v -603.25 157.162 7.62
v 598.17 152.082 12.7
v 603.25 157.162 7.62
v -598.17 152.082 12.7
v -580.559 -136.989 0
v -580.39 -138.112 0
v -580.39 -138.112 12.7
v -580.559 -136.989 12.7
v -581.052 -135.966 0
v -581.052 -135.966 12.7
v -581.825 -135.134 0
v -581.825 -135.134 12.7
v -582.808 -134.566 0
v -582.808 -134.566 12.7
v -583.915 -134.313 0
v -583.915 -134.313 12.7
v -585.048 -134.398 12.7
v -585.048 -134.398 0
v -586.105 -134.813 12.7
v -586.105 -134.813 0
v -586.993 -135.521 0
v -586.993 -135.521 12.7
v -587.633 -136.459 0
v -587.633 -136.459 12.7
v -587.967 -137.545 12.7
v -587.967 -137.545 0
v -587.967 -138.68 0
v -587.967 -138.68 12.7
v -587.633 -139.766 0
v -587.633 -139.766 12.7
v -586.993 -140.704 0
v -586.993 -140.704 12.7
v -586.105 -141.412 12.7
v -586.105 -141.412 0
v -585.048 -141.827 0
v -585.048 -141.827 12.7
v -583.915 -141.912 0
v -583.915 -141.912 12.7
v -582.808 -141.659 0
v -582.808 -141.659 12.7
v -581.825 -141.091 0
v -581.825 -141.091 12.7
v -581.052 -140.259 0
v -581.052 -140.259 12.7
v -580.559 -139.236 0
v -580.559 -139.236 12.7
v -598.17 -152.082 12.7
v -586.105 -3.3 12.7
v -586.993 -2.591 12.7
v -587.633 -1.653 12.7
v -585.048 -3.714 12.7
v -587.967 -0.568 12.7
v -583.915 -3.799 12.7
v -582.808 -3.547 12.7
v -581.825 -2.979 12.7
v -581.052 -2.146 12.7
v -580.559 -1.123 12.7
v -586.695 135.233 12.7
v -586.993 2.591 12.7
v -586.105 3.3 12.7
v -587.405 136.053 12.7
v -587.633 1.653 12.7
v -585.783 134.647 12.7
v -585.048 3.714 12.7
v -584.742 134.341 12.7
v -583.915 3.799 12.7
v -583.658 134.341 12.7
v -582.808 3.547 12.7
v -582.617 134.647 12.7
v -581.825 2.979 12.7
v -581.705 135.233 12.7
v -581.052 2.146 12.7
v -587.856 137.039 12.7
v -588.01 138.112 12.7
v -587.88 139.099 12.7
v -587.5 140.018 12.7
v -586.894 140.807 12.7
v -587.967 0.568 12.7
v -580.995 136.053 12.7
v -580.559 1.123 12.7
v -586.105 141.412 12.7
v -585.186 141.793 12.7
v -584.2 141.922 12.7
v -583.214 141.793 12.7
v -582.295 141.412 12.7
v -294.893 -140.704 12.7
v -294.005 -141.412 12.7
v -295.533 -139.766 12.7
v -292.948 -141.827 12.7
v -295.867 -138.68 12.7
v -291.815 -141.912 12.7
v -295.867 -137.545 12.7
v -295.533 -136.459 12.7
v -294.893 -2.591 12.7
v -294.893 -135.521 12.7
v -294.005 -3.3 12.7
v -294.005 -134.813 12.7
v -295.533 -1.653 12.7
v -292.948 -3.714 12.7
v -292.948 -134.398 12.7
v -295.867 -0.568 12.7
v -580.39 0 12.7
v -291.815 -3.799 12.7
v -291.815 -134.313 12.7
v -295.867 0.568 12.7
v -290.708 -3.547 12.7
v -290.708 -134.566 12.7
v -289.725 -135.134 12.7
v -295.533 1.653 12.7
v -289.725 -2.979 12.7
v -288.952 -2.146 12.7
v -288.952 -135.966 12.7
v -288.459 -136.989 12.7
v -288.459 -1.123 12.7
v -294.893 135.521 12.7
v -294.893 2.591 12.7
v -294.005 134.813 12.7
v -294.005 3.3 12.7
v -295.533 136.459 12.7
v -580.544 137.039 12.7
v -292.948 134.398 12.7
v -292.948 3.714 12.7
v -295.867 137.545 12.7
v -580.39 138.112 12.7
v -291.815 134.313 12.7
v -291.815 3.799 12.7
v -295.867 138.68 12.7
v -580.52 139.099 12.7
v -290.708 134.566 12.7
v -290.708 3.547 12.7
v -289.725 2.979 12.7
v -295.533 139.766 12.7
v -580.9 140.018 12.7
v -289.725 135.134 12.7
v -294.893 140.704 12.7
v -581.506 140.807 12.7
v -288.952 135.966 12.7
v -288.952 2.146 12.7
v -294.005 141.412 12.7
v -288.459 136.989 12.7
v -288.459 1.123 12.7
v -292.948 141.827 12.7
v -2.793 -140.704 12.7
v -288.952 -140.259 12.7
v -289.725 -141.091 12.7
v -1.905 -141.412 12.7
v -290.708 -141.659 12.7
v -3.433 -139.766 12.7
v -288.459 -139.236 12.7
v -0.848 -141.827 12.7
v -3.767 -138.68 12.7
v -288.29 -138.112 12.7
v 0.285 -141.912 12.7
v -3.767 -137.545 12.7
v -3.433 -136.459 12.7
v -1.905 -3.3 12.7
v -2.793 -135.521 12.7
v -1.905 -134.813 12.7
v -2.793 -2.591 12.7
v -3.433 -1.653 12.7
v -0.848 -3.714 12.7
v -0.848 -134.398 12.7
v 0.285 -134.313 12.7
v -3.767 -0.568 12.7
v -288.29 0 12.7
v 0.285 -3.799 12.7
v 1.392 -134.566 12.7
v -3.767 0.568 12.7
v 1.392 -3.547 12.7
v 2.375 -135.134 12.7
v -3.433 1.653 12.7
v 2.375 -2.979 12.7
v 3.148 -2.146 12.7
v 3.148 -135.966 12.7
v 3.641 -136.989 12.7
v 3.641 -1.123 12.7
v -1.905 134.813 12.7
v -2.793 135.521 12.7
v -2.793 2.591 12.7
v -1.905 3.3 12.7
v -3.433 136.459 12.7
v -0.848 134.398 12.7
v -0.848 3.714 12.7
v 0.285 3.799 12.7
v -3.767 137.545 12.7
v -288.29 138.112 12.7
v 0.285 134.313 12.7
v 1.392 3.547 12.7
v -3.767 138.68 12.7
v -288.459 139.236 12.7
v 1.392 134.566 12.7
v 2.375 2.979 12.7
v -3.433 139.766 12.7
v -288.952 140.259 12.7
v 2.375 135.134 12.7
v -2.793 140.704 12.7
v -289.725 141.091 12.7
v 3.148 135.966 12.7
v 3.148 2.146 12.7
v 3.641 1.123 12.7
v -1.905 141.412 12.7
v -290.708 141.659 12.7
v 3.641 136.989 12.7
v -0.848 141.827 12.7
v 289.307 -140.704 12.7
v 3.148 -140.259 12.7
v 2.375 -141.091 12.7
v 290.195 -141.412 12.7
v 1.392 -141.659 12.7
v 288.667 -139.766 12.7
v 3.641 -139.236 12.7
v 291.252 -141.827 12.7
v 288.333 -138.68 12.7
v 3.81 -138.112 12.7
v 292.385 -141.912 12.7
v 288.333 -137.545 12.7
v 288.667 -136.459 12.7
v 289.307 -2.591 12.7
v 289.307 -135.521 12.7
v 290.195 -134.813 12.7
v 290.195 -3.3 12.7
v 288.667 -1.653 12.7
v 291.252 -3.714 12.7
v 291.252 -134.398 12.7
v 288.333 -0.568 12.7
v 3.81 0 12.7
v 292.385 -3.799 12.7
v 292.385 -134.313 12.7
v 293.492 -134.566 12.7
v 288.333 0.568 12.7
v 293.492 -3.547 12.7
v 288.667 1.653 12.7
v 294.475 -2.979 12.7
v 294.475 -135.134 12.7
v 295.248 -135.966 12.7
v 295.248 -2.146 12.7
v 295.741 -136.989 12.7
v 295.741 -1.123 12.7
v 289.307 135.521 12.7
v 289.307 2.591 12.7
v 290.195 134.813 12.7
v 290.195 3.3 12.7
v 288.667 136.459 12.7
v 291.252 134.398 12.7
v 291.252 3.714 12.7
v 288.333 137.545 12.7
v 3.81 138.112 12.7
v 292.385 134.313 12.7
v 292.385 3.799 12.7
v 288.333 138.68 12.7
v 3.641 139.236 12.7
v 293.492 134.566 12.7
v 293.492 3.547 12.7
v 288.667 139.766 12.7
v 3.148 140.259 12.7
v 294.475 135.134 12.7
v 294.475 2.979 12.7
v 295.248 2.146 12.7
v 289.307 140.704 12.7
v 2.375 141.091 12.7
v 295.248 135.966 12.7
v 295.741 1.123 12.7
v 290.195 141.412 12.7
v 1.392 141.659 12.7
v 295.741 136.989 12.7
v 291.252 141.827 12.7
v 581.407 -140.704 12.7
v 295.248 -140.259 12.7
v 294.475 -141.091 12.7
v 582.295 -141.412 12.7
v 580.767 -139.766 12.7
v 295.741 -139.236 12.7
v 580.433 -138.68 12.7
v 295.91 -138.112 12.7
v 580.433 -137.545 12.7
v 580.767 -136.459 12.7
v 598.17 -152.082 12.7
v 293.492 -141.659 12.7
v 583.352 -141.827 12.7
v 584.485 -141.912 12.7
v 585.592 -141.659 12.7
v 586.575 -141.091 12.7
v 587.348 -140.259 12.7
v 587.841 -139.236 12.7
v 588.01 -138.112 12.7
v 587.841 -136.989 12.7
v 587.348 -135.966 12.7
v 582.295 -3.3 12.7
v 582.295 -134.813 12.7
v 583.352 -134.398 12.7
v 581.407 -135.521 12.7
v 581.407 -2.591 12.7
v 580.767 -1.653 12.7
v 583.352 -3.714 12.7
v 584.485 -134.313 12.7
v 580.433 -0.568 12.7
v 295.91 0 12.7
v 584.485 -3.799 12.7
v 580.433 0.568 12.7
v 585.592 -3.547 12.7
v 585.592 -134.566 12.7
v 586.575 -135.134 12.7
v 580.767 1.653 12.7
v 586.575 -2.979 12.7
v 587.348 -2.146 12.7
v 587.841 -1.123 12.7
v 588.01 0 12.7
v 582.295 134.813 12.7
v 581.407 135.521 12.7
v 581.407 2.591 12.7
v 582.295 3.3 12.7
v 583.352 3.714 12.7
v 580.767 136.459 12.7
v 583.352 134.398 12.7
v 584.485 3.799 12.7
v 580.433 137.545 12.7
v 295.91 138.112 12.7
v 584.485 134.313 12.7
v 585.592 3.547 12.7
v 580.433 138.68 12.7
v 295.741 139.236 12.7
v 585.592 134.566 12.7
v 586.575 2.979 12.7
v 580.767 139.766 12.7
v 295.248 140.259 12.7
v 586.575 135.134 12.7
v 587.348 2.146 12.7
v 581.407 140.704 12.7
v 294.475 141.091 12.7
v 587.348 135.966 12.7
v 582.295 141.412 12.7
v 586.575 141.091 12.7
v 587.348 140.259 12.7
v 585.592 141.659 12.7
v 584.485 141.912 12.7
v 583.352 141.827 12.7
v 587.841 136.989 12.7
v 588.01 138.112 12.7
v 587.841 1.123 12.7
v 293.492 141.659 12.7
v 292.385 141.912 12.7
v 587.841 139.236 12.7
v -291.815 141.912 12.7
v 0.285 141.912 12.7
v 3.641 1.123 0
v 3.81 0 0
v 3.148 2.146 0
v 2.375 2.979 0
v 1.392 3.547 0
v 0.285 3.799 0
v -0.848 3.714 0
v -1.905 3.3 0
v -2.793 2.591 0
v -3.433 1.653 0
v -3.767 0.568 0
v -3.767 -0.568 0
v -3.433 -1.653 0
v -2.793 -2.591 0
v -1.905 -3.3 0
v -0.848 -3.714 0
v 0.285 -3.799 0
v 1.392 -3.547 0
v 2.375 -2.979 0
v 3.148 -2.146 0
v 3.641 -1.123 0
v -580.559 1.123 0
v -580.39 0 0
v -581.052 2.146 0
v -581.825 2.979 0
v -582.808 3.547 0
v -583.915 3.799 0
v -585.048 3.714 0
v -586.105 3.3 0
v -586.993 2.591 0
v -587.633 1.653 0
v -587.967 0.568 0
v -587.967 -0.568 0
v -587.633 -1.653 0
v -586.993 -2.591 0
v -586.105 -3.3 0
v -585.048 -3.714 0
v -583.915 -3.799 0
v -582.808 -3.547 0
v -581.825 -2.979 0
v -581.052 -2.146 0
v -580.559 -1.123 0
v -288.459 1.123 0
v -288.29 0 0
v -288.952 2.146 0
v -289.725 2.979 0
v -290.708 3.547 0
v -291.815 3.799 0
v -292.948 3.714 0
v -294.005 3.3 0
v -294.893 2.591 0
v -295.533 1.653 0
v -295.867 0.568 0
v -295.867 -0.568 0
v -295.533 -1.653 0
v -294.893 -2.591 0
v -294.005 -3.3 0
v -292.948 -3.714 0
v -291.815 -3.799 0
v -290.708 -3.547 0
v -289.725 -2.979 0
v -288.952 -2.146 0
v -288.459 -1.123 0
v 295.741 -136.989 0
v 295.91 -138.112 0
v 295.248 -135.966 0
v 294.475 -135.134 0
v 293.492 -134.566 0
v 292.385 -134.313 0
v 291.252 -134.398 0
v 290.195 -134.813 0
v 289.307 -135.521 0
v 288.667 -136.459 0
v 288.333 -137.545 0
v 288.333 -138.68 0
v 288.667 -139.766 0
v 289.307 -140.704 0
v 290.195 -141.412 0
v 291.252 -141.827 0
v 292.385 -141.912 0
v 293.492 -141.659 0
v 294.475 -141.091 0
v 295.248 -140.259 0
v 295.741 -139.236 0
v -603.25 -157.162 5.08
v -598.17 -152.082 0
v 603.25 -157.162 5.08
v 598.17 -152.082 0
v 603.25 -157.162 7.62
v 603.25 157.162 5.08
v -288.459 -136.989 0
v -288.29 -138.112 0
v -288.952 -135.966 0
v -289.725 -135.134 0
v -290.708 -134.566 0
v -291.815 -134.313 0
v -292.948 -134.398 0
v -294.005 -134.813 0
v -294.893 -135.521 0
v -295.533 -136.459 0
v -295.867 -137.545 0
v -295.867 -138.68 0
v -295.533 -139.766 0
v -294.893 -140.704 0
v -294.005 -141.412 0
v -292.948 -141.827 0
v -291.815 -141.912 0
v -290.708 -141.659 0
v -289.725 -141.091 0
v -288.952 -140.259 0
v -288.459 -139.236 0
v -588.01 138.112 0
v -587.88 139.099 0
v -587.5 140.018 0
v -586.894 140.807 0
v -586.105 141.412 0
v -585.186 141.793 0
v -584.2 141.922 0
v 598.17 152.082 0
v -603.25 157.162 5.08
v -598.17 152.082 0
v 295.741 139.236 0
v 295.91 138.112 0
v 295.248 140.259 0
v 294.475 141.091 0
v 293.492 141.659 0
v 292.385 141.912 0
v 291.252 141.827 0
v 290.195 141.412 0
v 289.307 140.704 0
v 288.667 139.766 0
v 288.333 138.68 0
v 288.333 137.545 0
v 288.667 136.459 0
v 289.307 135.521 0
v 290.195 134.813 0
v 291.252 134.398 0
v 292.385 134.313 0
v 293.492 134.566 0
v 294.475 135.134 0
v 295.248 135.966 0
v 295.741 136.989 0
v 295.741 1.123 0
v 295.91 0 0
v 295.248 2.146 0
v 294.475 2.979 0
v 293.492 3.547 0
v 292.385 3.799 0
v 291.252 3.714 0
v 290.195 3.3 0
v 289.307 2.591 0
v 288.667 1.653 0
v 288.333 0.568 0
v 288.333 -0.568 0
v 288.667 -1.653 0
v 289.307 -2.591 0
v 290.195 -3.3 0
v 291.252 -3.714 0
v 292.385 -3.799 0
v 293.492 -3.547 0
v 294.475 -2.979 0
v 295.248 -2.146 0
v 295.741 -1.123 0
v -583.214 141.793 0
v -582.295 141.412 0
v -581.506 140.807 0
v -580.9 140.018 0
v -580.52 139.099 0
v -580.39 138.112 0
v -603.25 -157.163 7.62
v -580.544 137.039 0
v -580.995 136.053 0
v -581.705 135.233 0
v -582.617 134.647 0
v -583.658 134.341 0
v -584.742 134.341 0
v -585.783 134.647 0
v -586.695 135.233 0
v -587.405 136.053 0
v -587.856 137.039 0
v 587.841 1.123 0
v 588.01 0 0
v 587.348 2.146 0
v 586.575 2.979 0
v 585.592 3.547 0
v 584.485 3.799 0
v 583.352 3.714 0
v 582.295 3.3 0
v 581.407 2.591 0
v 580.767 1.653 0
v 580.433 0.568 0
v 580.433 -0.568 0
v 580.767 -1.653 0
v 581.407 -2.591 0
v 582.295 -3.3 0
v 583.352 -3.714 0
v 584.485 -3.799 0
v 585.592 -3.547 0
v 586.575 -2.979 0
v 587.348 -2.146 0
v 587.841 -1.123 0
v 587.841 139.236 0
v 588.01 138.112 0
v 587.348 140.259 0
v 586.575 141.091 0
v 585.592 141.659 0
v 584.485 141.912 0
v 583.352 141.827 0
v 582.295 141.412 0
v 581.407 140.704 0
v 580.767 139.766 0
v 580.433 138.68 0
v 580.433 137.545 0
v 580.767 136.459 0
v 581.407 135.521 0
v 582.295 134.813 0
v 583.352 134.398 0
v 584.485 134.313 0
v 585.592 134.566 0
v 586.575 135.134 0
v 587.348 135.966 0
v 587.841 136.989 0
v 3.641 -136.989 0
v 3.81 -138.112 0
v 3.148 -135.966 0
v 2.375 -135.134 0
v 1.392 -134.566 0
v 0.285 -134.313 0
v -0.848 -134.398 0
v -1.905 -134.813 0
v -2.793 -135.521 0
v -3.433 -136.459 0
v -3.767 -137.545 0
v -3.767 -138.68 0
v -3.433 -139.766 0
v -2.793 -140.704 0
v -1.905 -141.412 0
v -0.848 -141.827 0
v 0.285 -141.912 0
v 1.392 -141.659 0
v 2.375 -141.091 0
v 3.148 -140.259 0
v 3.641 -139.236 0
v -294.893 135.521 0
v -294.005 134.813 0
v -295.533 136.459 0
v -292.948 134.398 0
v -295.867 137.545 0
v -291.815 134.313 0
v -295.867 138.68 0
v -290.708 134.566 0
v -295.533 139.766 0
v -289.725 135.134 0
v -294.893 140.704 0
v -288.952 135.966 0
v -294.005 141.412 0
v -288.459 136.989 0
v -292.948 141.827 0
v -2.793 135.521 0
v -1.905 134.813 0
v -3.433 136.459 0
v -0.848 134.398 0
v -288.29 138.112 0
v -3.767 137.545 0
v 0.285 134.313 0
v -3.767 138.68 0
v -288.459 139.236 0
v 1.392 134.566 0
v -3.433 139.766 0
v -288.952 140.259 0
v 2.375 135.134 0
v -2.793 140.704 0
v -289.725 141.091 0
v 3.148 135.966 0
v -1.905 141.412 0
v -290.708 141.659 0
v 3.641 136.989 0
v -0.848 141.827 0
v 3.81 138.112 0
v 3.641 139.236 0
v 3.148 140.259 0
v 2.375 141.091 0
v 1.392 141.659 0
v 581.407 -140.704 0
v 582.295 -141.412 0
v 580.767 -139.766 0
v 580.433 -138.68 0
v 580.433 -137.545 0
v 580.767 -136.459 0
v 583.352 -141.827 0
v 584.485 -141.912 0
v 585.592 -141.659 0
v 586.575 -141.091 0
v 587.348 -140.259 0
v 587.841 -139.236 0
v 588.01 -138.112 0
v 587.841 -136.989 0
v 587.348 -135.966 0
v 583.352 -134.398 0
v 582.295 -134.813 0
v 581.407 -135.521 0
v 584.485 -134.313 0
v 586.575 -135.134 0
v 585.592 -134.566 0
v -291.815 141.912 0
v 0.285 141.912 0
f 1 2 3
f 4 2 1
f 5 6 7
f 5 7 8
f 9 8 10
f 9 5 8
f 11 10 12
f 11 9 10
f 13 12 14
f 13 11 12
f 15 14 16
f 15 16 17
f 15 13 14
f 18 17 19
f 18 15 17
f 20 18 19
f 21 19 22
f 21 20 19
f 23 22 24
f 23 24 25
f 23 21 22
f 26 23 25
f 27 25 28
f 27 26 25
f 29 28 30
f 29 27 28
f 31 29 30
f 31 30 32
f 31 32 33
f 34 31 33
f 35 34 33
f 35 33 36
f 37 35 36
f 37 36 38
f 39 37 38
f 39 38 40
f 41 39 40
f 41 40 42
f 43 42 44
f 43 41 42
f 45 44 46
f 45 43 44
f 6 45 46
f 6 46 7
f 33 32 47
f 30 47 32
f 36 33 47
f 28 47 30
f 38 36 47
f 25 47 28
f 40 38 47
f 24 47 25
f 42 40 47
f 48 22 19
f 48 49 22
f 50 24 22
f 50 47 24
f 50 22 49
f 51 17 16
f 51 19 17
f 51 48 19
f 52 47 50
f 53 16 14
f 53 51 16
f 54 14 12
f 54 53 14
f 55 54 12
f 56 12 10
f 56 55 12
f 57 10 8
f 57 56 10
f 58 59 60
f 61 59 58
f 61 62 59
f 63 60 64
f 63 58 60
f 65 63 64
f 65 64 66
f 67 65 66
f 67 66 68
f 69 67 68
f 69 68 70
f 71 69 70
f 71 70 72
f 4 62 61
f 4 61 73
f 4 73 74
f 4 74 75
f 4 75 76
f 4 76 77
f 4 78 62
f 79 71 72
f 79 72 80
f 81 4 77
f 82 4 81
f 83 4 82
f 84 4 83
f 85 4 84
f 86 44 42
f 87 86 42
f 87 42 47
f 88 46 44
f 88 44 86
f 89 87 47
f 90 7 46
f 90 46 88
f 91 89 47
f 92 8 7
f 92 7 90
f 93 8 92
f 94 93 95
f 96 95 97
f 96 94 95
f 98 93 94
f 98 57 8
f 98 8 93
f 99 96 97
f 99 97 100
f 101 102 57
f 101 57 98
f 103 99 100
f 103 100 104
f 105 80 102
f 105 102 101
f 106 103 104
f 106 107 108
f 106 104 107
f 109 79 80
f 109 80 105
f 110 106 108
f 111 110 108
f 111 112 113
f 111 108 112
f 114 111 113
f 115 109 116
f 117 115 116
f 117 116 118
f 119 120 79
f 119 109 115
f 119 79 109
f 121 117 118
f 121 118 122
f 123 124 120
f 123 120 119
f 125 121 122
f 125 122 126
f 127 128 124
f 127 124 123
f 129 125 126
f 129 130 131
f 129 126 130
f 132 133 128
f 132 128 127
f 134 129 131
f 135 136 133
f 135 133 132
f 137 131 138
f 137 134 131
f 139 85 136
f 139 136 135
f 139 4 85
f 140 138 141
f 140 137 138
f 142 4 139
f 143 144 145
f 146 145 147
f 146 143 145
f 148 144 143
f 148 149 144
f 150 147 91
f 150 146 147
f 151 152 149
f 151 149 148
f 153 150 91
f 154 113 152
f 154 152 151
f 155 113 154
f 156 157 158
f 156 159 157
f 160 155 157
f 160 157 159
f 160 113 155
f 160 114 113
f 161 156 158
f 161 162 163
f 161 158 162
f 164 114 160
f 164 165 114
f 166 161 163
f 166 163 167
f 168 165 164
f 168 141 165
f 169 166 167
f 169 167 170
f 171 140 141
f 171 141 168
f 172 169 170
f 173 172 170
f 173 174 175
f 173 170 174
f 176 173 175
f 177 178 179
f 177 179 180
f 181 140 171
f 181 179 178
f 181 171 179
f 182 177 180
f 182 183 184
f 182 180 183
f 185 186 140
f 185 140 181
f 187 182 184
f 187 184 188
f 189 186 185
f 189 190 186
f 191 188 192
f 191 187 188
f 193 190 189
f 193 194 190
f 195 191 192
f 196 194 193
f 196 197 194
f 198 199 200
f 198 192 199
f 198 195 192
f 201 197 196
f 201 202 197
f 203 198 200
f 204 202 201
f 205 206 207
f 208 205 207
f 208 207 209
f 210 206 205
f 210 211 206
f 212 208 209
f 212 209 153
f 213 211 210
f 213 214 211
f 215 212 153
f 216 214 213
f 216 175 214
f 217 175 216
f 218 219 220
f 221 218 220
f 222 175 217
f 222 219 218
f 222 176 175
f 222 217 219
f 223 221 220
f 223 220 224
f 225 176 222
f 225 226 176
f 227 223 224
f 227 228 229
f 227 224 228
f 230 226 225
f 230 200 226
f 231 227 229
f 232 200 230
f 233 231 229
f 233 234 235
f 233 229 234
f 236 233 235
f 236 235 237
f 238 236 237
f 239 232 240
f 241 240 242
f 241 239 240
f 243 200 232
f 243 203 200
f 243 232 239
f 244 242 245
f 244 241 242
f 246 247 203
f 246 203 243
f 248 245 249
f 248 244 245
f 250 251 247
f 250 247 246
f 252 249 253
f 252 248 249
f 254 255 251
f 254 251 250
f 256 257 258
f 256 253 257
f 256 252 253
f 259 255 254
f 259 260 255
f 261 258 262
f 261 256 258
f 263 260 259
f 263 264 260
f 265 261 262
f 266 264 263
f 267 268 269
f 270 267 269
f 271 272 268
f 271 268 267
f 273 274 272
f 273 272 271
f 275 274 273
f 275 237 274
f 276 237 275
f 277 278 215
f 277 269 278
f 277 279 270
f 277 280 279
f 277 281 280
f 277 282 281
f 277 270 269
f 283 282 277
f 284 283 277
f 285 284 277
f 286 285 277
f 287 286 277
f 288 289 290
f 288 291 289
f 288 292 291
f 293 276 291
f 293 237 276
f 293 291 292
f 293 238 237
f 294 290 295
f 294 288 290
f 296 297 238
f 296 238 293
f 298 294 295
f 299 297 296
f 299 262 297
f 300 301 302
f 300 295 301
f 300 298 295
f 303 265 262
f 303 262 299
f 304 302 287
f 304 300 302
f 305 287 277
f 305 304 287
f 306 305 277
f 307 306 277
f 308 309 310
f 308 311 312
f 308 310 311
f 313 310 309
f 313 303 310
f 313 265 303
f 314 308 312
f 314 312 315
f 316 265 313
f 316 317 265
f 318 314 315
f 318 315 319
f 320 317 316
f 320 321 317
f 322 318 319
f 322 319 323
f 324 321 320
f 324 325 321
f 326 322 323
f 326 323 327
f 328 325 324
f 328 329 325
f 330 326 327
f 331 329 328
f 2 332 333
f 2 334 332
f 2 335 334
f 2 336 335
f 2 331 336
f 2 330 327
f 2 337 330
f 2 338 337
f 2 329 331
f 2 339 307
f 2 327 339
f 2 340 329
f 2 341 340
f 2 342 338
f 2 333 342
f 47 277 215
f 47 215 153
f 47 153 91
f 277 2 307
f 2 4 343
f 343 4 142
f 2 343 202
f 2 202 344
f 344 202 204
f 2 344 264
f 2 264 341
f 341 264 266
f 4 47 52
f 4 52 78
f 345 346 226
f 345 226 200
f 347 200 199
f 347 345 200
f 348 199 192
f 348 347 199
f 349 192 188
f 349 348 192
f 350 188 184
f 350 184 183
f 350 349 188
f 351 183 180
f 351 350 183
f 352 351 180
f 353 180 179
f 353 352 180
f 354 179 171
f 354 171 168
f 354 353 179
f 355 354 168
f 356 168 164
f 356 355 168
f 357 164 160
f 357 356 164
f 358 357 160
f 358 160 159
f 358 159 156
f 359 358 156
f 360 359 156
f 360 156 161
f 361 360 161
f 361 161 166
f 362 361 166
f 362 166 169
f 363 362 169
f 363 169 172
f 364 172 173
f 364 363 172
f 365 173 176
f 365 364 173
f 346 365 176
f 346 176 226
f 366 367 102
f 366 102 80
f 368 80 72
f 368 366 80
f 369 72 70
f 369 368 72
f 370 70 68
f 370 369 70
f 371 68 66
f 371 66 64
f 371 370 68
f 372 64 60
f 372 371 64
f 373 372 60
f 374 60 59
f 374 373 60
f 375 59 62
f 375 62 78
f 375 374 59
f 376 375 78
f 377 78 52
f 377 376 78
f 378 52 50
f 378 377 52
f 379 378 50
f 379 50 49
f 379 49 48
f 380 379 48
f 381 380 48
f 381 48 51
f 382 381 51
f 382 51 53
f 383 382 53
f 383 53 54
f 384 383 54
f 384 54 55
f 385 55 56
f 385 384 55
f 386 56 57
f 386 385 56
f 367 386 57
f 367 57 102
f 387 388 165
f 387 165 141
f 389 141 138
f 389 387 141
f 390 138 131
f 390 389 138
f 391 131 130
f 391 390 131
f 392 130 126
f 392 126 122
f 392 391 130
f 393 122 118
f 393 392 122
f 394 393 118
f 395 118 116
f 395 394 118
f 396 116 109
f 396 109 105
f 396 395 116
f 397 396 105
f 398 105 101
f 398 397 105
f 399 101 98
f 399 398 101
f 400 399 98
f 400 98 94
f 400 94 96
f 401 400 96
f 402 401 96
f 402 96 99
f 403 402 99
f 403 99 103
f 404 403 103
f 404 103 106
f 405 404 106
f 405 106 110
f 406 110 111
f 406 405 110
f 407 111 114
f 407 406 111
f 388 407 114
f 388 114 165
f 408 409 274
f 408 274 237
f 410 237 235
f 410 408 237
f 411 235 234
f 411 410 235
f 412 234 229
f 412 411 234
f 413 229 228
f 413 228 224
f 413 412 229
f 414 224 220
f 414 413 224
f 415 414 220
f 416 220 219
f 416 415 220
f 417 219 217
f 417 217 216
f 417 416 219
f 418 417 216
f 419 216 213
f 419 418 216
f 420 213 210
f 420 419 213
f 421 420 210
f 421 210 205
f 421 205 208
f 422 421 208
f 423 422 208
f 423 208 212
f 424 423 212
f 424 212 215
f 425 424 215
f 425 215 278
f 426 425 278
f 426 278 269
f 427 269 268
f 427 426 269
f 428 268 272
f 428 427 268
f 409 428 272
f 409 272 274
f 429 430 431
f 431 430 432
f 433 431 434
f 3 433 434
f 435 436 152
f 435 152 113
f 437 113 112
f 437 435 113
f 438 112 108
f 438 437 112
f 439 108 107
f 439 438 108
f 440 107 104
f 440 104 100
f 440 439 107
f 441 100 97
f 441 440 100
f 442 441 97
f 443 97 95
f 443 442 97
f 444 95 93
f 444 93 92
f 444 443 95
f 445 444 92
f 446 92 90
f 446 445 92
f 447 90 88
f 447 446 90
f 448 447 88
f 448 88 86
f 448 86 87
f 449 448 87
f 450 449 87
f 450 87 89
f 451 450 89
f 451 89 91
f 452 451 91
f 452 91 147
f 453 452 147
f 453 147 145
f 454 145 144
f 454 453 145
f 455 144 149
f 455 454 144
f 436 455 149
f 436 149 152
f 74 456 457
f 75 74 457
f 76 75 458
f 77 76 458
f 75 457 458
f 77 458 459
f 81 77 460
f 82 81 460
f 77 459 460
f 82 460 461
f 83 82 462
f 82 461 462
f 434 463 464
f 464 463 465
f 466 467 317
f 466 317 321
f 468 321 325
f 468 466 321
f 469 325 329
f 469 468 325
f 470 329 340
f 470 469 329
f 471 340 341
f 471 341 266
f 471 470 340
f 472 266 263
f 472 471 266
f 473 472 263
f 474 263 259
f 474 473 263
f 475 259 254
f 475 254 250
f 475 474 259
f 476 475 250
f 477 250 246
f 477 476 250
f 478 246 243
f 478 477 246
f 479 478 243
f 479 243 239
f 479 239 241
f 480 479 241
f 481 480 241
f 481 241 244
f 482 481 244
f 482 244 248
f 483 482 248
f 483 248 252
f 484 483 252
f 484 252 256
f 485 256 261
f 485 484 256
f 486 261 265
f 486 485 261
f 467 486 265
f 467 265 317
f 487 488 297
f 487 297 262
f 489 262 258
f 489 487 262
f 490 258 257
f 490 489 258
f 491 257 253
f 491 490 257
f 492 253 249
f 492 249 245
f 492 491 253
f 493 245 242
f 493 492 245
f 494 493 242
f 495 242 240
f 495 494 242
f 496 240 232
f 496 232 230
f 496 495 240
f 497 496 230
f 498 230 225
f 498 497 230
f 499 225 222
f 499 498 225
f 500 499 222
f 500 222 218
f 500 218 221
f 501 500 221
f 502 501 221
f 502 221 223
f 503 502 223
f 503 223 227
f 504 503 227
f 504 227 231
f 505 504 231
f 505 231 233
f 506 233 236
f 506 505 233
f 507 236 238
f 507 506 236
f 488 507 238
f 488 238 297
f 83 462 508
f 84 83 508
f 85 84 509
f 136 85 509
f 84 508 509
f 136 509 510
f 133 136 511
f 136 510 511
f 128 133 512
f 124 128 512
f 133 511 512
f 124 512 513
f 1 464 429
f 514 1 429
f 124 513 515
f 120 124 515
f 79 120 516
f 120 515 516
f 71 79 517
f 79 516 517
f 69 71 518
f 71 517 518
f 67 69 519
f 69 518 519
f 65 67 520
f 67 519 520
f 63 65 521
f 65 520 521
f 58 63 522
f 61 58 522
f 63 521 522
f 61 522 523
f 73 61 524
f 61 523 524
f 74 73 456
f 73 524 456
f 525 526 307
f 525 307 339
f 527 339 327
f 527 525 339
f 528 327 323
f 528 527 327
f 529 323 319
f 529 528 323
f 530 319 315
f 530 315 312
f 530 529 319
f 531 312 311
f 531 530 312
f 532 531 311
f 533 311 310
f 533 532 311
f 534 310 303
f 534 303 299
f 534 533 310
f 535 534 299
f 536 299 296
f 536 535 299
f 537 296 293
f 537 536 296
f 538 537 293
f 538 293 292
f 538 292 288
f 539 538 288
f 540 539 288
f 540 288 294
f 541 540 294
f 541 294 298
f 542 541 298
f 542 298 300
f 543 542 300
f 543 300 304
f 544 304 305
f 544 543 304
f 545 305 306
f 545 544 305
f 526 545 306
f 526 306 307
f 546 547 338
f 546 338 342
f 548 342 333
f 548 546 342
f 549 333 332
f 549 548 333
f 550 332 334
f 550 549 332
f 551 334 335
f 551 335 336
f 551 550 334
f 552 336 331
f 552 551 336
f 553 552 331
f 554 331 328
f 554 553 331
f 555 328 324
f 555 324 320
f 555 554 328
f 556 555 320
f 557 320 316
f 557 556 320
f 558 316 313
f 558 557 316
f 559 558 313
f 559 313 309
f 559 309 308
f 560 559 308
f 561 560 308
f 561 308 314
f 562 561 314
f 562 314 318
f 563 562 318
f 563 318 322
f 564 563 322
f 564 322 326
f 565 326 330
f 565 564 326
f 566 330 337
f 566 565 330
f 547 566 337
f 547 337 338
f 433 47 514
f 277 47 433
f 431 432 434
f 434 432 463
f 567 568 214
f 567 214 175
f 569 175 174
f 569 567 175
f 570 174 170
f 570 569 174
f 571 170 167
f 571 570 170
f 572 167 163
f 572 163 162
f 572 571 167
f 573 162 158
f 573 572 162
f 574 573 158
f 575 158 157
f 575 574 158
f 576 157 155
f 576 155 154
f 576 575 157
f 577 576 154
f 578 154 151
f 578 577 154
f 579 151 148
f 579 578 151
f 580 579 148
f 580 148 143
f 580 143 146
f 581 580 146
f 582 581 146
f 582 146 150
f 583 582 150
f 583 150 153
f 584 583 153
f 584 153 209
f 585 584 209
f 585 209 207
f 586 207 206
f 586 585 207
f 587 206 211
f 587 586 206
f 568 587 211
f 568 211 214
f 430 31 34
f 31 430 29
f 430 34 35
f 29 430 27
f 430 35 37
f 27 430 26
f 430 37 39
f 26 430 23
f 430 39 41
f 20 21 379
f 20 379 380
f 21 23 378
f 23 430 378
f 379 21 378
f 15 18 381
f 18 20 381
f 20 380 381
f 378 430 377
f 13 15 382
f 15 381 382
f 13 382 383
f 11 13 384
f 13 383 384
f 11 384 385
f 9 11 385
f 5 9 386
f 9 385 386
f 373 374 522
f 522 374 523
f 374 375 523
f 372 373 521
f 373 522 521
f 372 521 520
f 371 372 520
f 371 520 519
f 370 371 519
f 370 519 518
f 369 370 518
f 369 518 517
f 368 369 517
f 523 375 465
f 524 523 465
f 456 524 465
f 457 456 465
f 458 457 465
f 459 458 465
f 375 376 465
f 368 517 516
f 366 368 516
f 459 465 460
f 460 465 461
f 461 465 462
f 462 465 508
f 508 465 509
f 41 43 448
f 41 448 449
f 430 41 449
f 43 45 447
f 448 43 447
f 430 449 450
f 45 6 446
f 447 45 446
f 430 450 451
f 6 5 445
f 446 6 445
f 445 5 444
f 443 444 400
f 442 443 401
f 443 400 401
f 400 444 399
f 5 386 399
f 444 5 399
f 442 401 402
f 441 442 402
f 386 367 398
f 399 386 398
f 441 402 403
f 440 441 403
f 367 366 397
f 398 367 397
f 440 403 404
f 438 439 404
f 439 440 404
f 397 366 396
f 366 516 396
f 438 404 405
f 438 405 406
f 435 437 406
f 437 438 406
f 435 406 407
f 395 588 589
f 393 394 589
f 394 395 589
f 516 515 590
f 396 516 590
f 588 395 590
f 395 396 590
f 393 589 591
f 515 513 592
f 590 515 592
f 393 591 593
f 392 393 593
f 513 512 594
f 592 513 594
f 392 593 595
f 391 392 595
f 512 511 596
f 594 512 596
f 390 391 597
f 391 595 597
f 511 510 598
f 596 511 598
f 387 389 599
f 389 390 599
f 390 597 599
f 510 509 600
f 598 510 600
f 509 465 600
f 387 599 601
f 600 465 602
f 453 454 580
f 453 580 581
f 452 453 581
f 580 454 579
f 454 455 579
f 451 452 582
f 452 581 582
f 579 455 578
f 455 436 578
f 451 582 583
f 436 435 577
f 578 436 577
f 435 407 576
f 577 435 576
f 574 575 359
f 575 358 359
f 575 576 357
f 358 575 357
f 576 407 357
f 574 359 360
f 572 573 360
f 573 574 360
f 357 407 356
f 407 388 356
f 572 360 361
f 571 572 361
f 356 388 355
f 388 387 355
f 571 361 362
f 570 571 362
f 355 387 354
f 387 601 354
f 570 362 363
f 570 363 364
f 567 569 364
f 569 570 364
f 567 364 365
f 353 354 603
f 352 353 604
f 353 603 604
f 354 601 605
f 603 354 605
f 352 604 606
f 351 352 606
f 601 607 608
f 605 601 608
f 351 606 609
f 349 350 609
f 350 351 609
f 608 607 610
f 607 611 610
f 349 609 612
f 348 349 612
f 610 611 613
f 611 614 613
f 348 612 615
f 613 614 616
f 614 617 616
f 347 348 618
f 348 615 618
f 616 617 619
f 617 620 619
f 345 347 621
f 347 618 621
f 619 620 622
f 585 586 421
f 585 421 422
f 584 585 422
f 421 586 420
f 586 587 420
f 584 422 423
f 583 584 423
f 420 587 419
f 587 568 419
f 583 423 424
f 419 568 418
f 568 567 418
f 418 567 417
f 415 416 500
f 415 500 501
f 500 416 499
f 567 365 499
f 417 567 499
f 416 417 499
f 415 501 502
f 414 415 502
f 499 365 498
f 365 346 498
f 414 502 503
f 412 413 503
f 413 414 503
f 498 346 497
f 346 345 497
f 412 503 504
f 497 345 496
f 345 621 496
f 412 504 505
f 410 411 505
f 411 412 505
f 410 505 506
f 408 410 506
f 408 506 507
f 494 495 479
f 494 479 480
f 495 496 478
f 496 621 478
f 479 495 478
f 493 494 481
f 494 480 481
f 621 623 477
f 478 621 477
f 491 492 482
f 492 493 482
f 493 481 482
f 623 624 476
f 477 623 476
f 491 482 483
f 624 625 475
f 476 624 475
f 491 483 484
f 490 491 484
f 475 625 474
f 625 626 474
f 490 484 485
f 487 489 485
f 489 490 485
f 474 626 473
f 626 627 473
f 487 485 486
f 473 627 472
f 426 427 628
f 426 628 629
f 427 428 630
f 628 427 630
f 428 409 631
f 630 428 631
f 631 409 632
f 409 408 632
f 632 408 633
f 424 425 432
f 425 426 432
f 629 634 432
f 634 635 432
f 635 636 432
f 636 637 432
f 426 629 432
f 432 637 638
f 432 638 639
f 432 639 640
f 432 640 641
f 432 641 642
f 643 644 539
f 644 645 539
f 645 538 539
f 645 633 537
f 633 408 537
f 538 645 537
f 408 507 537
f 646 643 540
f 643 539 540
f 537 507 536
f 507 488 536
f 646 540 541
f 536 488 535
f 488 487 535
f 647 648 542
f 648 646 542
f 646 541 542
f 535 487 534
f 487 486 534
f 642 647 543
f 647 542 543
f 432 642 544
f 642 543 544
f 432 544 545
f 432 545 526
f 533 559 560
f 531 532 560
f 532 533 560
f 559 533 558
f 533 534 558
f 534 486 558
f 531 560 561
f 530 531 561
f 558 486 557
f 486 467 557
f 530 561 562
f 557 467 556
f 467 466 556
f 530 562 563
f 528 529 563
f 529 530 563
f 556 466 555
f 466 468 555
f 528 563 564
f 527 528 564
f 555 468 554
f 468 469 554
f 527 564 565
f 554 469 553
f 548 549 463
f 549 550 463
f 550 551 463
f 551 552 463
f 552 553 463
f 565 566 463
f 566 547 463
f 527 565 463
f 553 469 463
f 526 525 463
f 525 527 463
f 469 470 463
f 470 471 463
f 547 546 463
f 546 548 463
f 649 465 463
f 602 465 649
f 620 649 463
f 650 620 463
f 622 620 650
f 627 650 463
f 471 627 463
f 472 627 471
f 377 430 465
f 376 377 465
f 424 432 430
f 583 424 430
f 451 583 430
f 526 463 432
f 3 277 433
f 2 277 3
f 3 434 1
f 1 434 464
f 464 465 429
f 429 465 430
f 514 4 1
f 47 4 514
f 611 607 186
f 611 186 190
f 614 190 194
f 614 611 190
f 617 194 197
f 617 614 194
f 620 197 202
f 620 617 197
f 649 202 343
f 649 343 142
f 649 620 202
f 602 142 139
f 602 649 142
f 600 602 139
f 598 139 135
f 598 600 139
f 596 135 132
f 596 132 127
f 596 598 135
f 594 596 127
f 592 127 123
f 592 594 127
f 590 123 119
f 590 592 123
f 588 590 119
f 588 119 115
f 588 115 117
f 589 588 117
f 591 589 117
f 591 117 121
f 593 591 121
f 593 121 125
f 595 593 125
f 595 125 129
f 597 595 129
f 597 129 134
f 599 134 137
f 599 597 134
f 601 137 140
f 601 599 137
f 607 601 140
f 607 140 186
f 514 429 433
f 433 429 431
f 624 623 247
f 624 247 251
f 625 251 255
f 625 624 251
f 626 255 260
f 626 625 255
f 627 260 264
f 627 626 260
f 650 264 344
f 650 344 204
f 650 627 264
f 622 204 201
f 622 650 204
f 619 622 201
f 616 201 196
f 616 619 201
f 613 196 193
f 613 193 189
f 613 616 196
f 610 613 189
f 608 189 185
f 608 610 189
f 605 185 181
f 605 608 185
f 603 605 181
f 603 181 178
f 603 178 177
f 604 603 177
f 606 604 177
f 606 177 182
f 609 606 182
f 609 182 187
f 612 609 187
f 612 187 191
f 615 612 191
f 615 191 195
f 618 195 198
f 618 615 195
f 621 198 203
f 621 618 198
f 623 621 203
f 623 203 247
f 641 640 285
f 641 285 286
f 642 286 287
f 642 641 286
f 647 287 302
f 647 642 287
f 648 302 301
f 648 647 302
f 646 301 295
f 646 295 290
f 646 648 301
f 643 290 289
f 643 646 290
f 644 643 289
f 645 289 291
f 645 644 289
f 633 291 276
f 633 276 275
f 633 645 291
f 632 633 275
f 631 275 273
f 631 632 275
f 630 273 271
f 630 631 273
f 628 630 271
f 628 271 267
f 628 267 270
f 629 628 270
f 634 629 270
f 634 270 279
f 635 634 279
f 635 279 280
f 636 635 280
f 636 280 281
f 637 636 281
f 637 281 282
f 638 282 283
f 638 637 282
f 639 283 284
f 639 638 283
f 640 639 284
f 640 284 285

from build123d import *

# Parameters (mm, degrees)
F0_R     = 3.81
F1_DEPTH = 12.7
F2_SIZE  = 5.08


with BuildPart() as f1:
    # F0 (on Top) → F1 (new body)
    with BuildSketch(Plane.XY):
        with BuildLine():
            Line((603.25, -157.1625), (603.25, 157.1625))
            Line((603.25, 157.1625), (-584.2, 157.1625))
            Line((-584.2, 157.1625), (-584.2, 141.9225))
            ThreePointArc((-584.2, 141.9225), (-581.505923, 140.806577), (-580.39, 138.1125))
            ThreePointArc((-580.39, 138.1125), (-584.2, 134.3025), (-588.01, 138.1125))
            Line((-588.01, 138.1125), (-603.25, 138.1125))
            Line((-603.25, 138.1125), (-603.25, -157.1625))
            Line((-603.25, -157.1625), (603.25, -157.1625))
        make_face()
        with Locations((-584.2, -138.1125)):
            Circle(F0_R, mode=Mode.SUBTRACT)
        with Locations((-292.1, -138.1125)):
            Circle(F0_R, mode=Mode.SUBTRACT)
        with Locations((0, -138.1125)):
            Circle(F0_R, mode=Mode.SUBTRACT)
        with Locations((292.1, -138.1125)):
            Circle(F0_R, mode=Mode.SUBTRACT)
        with Locations((584.2, -138.1125)):
            Circle(F0_R, mode=Mode.SUBTRACT)
        with Locations((-584.2, 0)):
            Circle(F0_R, mode=Mode.SUBTRACT)
        with Locations((-292.1, 0)):
            Circle(F0_R, mode=Mode.SUBTRACT)
        with Locations((-292.1, 138.1125)):
            Circle(F0_R, mode=Mode.SUBTRACT)
        Circle(F0_R, mode=Mode.SUBTRACT)
        with Locations((292.1, 0)):
            Circle(F0_R, mode=Mode.SUBTRACT)
        with Locations((584.2, 0)):
            Circle(F0_R, mode=Mode.SUBTRACT)
        with Locations((0, 138.1125)):
            Circle(F0_R, mode=Mode.SUBTRACT)
        with Locations((292.1, 138.1125)):
            Circle(F0_R, mode=Mode.SUBTRACT)
        with Locations((584.2, 138.1125)):
            Circle(F0_R, mode=Mode.SUBTRACT)
        with BuildLine():
            Line((-584.2, 141.9225), (-584.2, 157.1625))
            Line((-584.2, 157.1625), (-603.25, 157.1625))
            Line((-603.25, 157.1625), (-603.25, 138.1125))
            Line((-603.25, 138.1125), (-588.01, 138.1125))
            ThreePointArc((-588.01, 138.1125), (-586.894077, 140.806577), (-584.2, 141.9225))
        make_face()
    extrude(amount=F1_DEPTH)

    # F2
    f2_edges = [f1.edges().sort_by_distance(p)[0] for p in [
        (0, 157.1625, 0),
        (603.25, 0, 0),
        (0, -157.1625, 0),
        (-603.25, 0, 0),
        (0, -157.1625, 12.7),
        (603.25, 0, 12.7),
        (0, 157.1625, 12.7),
        (-603.25, 0, 12.7),
    ]]
    chamfer(f2_edges, length=F2_SIZE)


solid = f1.part
